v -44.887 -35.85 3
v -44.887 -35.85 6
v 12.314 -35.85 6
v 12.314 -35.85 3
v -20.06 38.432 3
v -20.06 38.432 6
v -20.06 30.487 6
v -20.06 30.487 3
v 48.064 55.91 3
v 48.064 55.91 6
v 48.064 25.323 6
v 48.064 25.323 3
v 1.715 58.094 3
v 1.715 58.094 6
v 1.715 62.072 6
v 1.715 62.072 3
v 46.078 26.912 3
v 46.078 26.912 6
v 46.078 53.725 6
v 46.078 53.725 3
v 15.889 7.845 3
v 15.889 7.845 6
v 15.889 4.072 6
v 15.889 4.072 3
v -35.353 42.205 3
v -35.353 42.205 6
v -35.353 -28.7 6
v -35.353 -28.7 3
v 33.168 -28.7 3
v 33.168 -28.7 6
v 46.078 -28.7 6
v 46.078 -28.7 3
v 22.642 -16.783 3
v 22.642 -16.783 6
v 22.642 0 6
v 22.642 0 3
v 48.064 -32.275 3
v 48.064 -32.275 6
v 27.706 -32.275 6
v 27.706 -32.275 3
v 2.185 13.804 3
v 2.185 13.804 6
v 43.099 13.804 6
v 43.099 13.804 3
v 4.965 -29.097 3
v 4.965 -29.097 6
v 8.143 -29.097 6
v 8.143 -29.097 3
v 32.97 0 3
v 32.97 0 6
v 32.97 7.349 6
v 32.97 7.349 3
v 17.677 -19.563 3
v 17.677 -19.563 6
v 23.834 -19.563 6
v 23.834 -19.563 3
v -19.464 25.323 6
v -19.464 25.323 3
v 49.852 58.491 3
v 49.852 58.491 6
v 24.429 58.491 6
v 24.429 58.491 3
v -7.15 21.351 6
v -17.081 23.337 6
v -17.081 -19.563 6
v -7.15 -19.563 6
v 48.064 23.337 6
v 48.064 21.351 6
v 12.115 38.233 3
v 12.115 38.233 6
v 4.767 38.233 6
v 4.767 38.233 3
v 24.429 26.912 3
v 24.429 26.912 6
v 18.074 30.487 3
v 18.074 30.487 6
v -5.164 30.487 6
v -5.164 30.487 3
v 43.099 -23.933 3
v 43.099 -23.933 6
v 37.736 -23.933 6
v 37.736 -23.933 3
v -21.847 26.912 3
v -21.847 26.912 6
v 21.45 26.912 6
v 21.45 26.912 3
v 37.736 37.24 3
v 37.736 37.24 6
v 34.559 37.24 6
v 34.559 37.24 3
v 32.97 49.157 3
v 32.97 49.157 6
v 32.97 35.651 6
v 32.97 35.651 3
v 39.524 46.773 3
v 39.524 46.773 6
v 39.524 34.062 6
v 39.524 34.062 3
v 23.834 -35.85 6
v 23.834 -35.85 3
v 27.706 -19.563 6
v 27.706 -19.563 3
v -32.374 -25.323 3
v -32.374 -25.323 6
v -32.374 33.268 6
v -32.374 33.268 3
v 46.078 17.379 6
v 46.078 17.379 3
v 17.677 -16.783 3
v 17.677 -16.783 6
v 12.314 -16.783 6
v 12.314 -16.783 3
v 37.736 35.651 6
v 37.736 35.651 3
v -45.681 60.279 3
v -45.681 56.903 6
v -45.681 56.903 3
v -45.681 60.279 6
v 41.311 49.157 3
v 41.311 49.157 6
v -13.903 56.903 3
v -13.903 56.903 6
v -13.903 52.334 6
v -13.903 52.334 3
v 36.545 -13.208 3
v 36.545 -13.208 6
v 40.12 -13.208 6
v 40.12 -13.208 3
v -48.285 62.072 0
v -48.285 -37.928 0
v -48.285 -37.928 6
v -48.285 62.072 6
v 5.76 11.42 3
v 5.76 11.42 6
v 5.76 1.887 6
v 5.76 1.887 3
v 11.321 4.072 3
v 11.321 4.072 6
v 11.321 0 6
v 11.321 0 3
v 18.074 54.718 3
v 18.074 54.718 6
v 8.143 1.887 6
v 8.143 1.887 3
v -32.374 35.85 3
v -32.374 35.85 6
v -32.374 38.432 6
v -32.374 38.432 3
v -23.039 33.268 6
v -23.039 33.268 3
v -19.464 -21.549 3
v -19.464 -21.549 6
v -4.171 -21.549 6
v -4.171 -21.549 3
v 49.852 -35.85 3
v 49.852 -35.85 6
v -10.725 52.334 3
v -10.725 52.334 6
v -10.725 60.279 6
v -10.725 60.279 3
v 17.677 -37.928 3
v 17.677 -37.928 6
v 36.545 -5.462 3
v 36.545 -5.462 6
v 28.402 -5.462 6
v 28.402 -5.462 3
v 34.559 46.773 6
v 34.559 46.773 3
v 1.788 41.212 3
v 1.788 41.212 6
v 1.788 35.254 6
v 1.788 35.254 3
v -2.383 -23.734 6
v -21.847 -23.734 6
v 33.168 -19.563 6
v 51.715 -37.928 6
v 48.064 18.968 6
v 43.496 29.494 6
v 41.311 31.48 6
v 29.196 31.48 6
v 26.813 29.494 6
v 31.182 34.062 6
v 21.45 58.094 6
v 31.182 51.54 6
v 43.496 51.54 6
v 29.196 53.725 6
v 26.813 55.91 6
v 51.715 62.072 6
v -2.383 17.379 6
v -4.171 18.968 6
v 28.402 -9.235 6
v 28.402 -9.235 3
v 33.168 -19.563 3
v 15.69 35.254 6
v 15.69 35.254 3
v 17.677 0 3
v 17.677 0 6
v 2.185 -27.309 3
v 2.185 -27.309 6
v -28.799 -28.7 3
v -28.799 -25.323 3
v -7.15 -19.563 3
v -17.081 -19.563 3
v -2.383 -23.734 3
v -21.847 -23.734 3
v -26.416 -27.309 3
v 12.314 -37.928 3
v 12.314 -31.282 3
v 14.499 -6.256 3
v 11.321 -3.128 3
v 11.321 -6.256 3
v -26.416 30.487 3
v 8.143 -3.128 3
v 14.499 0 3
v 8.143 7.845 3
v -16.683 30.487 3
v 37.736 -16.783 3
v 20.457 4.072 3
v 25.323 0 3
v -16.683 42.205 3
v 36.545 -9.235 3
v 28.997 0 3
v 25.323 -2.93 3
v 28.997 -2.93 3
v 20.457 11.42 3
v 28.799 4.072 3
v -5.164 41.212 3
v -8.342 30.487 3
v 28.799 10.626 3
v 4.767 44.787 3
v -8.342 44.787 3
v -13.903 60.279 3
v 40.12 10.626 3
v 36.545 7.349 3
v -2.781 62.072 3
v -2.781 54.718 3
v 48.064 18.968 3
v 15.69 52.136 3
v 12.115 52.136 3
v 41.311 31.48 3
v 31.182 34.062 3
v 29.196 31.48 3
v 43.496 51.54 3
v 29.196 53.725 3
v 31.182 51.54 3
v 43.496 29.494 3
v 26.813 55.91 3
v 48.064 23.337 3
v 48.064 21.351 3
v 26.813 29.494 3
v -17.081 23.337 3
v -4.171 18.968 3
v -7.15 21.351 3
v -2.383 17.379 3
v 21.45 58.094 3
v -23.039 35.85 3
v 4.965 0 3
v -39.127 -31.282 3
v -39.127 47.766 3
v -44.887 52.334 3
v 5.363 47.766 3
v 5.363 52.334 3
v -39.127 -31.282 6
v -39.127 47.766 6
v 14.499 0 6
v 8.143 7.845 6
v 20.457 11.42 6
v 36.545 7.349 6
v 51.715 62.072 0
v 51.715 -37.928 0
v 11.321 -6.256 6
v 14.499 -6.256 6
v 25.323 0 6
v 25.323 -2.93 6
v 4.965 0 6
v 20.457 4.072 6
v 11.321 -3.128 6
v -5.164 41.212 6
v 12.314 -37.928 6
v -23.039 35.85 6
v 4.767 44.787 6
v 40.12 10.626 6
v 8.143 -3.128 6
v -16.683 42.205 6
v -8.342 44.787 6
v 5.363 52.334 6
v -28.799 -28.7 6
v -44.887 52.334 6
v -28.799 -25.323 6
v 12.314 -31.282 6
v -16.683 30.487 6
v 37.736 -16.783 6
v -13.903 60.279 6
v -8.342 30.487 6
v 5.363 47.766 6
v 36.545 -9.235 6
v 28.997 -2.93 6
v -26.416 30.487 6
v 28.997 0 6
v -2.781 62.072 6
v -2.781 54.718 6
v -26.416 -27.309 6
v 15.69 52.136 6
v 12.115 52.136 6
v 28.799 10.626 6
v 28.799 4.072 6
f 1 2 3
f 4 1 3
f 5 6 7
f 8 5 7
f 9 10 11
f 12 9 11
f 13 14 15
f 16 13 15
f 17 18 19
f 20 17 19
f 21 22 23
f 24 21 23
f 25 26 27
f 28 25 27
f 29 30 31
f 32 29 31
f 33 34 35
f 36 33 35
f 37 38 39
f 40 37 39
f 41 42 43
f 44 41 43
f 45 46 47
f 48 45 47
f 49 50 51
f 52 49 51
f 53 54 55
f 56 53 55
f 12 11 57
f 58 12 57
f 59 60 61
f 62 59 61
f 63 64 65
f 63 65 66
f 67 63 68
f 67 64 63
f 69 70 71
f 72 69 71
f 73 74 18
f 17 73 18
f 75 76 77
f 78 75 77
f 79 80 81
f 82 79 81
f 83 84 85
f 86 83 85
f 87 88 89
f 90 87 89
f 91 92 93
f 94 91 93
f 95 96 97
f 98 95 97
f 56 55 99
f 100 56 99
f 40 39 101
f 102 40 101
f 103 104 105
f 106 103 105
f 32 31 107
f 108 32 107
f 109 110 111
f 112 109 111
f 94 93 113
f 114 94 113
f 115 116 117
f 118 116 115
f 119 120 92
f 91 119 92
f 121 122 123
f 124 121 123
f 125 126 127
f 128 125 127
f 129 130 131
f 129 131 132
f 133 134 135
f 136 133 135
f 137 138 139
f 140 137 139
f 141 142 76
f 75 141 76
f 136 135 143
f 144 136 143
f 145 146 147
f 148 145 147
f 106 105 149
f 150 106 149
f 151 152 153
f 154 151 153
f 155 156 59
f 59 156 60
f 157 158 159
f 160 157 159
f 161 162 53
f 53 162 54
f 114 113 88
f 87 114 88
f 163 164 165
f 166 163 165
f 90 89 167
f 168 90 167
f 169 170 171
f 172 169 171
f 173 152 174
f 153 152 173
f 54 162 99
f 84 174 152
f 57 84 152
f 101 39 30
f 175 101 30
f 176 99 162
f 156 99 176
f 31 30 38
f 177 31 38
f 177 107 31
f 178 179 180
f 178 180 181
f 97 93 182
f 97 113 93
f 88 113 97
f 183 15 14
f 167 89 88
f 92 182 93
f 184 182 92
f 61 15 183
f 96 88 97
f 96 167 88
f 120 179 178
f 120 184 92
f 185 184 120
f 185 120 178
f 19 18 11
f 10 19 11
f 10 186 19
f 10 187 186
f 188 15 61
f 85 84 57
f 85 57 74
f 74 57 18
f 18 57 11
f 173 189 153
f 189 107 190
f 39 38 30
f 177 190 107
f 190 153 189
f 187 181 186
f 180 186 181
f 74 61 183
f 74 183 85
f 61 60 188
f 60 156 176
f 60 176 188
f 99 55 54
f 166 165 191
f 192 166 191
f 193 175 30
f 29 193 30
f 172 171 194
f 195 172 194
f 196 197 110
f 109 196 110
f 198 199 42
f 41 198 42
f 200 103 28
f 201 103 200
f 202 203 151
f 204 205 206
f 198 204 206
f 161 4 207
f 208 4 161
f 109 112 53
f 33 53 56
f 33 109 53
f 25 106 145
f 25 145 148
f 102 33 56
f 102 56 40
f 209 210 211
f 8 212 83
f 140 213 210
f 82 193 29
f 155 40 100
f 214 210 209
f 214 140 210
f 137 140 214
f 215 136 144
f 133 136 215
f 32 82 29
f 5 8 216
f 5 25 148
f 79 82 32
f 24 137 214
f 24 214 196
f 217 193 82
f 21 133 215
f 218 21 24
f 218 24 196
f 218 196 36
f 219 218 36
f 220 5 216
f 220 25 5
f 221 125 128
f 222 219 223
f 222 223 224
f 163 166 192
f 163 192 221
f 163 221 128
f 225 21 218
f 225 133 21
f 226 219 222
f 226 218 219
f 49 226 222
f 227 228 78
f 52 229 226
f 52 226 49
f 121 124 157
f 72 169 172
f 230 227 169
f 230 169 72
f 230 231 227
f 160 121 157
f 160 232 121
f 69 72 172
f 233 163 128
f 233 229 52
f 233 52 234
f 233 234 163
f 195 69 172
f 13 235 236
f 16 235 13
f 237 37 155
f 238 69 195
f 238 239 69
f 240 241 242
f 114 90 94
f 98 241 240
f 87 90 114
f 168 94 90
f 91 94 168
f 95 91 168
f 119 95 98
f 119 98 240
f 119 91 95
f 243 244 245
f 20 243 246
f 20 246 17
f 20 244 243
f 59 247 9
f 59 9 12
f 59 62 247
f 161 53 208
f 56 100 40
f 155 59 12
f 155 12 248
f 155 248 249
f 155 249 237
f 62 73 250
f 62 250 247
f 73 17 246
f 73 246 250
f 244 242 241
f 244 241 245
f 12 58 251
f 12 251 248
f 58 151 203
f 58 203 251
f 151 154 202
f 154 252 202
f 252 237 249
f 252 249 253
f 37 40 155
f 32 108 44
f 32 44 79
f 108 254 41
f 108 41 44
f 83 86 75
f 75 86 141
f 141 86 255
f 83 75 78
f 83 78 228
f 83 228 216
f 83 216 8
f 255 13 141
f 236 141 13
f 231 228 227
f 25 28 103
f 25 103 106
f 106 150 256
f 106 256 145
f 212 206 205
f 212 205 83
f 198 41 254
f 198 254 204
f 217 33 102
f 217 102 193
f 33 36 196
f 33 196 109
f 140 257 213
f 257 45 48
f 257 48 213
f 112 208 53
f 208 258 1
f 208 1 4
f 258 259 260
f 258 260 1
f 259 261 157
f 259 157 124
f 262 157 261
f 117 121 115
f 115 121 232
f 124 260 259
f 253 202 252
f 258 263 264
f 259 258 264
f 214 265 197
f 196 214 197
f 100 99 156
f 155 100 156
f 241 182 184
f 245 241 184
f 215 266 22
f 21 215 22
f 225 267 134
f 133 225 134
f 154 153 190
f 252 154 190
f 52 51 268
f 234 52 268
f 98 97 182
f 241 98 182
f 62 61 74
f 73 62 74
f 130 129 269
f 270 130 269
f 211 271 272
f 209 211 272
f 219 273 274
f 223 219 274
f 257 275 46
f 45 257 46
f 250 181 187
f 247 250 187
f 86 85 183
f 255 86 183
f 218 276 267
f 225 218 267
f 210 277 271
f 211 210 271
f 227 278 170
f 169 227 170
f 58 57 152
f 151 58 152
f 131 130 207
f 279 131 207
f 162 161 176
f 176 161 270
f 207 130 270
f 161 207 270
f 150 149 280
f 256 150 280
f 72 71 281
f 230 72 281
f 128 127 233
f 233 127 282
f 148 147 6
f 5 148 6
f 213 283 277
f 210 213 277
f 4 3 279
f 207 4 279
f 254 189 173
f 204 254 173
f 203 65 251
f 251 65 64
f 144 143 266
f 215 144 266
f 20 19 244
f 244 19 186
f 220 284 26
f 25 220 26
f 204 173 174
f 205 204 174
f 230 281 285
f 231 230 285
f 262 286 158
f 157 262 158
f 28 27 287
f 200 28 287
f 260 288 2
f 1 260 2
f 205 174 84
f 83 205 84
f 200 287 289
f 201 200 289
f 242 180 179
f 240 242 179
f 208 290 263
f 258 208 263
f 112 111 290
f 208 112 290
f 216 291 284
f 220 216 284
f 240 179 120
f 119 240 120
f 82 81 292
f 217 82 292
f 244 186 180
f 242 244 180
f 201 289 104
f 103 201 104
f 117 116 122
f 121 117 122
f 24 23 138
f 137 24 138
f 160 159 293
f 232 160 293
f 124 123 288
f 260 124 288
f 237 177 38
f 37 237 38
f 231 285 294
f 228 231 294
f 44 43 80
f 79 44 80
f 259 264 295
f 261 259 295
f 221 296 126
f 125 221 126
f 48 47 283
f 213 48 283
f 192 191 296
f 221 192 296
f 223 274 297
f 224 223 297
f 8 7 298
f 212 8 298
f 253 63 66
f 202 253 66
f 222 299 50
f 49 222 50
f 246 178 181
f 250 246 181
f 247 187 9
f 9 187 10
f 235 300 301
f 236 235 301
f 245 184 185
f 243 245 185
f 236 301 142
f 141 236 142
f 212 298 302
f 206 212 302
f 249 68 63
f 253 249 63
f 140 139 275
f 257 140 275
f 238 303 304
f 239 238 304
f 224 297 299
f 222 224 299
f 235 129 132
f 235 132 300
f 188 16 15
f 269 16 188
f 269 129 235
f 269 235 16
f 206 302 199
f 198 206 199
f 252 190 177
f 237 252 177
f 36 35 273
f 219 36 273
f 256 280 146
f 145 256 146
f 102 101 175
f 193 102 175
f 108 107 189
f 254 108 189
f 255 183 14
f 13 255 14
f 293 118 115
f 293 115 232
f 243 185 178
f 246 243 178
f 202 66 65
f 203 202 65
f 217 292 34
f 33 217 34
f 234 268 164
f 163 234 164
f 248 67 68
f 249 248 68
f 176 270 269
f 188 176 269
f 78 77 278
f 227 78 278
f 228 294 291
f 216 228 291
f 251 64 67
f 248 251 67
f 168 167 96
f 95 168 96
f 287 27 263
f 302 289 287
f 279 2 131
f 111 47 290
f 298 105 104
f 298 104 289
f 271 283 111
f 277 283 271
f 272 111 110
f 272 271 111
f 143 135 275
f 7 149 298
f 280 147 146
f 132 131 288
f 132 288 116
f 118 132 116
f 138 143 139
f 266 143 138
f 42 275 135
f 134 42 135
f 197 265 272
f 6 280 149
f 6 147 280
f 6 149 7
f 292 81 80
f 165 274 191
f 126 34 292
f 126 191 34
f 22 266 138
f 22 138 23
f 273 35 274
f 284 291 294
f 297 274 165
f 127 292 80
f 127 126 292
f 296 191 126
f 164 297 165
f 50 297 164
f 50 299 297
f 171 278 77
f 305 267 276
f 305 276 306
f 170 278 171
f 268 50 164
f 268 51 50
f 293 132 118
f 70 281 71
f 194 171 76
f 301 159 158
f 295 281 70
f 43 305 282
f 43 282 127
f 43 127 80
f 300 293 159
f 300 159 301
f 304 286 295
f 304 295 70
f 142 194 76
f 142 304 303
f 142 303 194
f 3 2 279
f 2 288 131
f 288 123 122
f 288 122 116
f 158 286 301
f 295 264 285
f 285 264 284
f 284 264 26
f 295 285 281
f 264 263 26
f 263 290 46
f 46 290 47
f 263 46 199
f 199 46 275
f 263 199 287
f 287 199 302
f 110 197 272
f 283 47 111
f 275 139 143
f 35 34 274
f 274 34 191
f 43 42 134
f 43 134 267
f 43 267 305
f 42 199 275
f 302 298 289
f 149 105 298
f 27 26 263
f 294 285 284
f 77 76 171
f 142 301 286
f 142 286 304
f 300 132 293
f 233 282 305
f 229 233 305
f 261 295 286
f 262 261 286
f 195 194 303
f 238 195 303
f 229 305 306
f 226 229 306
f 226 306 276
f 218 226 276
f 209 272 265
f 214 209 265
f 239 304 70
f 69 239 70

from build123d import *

# Parameters (mm, degrees)
F0_W     = 100
F0_H     = 100
F1_DEPTH = 6
F2_W     = 31.778058
F2_H     = 3.376421
F3_DEPTH = 3


with BuildPart() as f1:
    # F0 (on Top) → F1 (new body)
    with BuildSketch(Plane.XY):
        with Locations((1.715221, 12.071789)):
            Rectangle(F0_W, F0_H)
    extrude(amount=F1_DEPTH)

    # F2 (on face) → F3 (cut)
    with BuildSketch(Plane.XY.offset(6)):
        Polygon((12.313999, -35.849623), (12.313999, -37.928211), (17.676545, -37.928211), (17.676545, -19.563368), (23.833545, -19.563368), (23.833545, -35.849623), (27.706495, -35.849623), (49.851827, -35.849623), (49.851827, -32.274589), (49.851827, 58.491487), (48.064318, 58.491487), (24.429381, 58.491487), (24.429381, 55.909526), (24.429381, 26.912043), (26.812738, 26.912043), (46.078186, 26.912043), (46.078186, 29.494012), (46.078186, 53.724784), (43.496218, 53.724784), (29.196093, 53.724784), (29.196093, 51.540039), (29.196093, 31.480141), (31.182222, 31.480141), (41.311476, 31.480141), (41.311476, 34.062106), (41.311476, 49.156684), (39.523959, 49.156684), (32.969736, 49.156684), (32.969736, 46.773333), (32.969736, 35.65101), (34.558639, 35.65101), (37.736446, 35.65101), (37.736446, 37.239913), (34.558639, 37.239913), (34.558639, 46.773333), (39.523959, 46.773333), (39.523959, 34.062106), (31.182222, 34.062106), (31.182222, 51.540039), (43.496218, 51.540039), (43.496218, 29.494012), (26.812738, 29.494012), (26.812738, 55.909526), (48.064318, 55.909526), (48.064318, 25.323141), (-17.080707, 25.323141), (-19.464061, 25.323141), (-19.464061, -19.563368), (-19.464061, -21.549497), (-7.150063, -21.549497), (-4.17087, -21.549497), (-4.17087, 18.967528), (48.064318, 18.967528), (48.064318, -32.274589), (27.706495, -32.274589), (27.706495, -19.563368), (33.168349, -19.563368), (33.168349, -28.699558), (37.736446, -28.699558), (43.098994, -28.699558), (46.078186, -28.699558), (46.078186, 17.378626), (43.098994, 17.378626), (2.184742, 17.378626), (-2.383354, 17.378626), (-2.383354, -23.734238), (-21.847416, -23.734238), (-21.847416, 26.912043), (18.073771, 26.912043), (21.450188, 26.912043), (21.450188, 58.094267), (18.073771, 58.094267), (1.715221, 58.094267), (1.715221, 62.071789), (-2.780579, 62.071789), (-2.780579, 58.094267), (-2.780579, 54.717846), (18.073771, 54.717846), (18.073771, 30.487075), (-5.163935, 30.487075), (-5.163935, 41.212171), (1.787515, 41.212171), (1.787515, 35.253786), (4.766708, 35.253786), (15.690416, 35.253786), (15.690416, 38.232978), (15.690416, 52.135877), (12.115386, 52.135877), (12.115386, 38.232978), (4.766708, 38.232978), (4.766708, 41.212171), (4.766708, 44.787202), (-5.163935, 44.787202), (-8.34174, 44.787202), (-8.34174, 30.487075), (-16.683482, 30.487075), (-16.683482, 42.205233), (-20.0599, 42.205233), (-35.353091, 42.205233), (-35.353091, 38.431592), (-35.353091, -28.699558), (-32.373898, -28.699558), (-28.798867, -28.699558), (-28.798867, -25.323141), (-32.373898, -25.323141), (-32.373898, 33.267654), (-23.039093, 33.267654), (-23.039093, 35.849623), (-32.373898, 35.849623), (-32.373898, 38.431592), (-20.0599, 38.431592), (-20.0599, 30.487075), (-21.847416, 30.487075), (-26.415512, 30.487075), (-26.415512, -23.734238), (-26.415512, -27.309269), (-2.383354, -27.309269), (2.184742, -27.309269), (2.184742, 13.803595), (43.098994, 13.803595), (43.098994, -23.932852), (37.736446, -23.932852), (37.736446, -19.563368), (37.736446, -16.782787), (22.641867, -16.782787), (17.676545, -16.782787), (12.313999, -16.782787), (12.313999, -31.281527), (-39.126735, -31.281527), (-39.126735, 47.766395), (5.362547, 47.766395), (5.362547, 52.334495), (-10.725095, 52.334495), (-13.902901, 52.334495), (-39.126735, 52.334495), (-44.886511, 52.334495), (-44.886511, -31.281527), (-44.886511, -35.849623), align=None)
        Polygon((48.064318, 23.337012), (48.064318, 21.350883), (-4.17087, 21.350883), (-7.150063, 21.350883), (-7.150063, -19.563368), (-17.080707, -19.563368), (-17.080707, 23.337012), align=None, mode=Mode.SUBTRACT)
        Polygon((-13.902901, 56.902587), (-13.902901, 52.334495), (-10.725095, 52.334495), (-10.725095, 60.279008), (-13.902901, 60.279008), align=None)
        with Locations((-29.79193, 58.590797)):
            Rectangle(F2_W, F2_H)
        Polygon((17.676545, 0), (17.676545, -16.782787), (22.641867, -16.782787), (22.641867, 0), (25.32314, 0), (25.32314, -2.92954), (28.997479, -2.92954), (28.997479, 0), (32.969736, 0), (32.969736, 4.071564), (32.969736, 7.348676), (36.544766, 7.348676), (36.544766, -5.461854), (28.401639, -5.461854), (28.401639, -9.235498), (36.544766, -9.235498), (36.544766, -13.207756), (40.119801, -13.207756), (40.119801, 7.348676), (40.119801, 10.625788), (32.969736, 10.625788), (28.798867, 10.625788), (28.798867, 4.071564), (20.457124, 4.071564), (20.457124, 11.420241), (15.88903, 11.420241), (5.759772, 11.420241), (5.759772, 7.845208), (5.759772, 1.886822), (8.143128, 1.886822), (8.143128, 7.845208), (15.88903, 7.845208), (15.88903, 4.071564), (11.320934, 4.071564), (11.320934, 0), (4.965322, 0), (4.965322, -3.128153), (4.965322, -29.096784), (8.143129, -29.096784), (8.143129, -3.128153), (11.320934, -3.128153), (11.320934, -6.256306), (14.49874, -6.256306), (14.49874, 0), align=None)
    extrude(amount=-F3_DEPTH, mode=Mode.SUBTRACT)


solid = f1.part
